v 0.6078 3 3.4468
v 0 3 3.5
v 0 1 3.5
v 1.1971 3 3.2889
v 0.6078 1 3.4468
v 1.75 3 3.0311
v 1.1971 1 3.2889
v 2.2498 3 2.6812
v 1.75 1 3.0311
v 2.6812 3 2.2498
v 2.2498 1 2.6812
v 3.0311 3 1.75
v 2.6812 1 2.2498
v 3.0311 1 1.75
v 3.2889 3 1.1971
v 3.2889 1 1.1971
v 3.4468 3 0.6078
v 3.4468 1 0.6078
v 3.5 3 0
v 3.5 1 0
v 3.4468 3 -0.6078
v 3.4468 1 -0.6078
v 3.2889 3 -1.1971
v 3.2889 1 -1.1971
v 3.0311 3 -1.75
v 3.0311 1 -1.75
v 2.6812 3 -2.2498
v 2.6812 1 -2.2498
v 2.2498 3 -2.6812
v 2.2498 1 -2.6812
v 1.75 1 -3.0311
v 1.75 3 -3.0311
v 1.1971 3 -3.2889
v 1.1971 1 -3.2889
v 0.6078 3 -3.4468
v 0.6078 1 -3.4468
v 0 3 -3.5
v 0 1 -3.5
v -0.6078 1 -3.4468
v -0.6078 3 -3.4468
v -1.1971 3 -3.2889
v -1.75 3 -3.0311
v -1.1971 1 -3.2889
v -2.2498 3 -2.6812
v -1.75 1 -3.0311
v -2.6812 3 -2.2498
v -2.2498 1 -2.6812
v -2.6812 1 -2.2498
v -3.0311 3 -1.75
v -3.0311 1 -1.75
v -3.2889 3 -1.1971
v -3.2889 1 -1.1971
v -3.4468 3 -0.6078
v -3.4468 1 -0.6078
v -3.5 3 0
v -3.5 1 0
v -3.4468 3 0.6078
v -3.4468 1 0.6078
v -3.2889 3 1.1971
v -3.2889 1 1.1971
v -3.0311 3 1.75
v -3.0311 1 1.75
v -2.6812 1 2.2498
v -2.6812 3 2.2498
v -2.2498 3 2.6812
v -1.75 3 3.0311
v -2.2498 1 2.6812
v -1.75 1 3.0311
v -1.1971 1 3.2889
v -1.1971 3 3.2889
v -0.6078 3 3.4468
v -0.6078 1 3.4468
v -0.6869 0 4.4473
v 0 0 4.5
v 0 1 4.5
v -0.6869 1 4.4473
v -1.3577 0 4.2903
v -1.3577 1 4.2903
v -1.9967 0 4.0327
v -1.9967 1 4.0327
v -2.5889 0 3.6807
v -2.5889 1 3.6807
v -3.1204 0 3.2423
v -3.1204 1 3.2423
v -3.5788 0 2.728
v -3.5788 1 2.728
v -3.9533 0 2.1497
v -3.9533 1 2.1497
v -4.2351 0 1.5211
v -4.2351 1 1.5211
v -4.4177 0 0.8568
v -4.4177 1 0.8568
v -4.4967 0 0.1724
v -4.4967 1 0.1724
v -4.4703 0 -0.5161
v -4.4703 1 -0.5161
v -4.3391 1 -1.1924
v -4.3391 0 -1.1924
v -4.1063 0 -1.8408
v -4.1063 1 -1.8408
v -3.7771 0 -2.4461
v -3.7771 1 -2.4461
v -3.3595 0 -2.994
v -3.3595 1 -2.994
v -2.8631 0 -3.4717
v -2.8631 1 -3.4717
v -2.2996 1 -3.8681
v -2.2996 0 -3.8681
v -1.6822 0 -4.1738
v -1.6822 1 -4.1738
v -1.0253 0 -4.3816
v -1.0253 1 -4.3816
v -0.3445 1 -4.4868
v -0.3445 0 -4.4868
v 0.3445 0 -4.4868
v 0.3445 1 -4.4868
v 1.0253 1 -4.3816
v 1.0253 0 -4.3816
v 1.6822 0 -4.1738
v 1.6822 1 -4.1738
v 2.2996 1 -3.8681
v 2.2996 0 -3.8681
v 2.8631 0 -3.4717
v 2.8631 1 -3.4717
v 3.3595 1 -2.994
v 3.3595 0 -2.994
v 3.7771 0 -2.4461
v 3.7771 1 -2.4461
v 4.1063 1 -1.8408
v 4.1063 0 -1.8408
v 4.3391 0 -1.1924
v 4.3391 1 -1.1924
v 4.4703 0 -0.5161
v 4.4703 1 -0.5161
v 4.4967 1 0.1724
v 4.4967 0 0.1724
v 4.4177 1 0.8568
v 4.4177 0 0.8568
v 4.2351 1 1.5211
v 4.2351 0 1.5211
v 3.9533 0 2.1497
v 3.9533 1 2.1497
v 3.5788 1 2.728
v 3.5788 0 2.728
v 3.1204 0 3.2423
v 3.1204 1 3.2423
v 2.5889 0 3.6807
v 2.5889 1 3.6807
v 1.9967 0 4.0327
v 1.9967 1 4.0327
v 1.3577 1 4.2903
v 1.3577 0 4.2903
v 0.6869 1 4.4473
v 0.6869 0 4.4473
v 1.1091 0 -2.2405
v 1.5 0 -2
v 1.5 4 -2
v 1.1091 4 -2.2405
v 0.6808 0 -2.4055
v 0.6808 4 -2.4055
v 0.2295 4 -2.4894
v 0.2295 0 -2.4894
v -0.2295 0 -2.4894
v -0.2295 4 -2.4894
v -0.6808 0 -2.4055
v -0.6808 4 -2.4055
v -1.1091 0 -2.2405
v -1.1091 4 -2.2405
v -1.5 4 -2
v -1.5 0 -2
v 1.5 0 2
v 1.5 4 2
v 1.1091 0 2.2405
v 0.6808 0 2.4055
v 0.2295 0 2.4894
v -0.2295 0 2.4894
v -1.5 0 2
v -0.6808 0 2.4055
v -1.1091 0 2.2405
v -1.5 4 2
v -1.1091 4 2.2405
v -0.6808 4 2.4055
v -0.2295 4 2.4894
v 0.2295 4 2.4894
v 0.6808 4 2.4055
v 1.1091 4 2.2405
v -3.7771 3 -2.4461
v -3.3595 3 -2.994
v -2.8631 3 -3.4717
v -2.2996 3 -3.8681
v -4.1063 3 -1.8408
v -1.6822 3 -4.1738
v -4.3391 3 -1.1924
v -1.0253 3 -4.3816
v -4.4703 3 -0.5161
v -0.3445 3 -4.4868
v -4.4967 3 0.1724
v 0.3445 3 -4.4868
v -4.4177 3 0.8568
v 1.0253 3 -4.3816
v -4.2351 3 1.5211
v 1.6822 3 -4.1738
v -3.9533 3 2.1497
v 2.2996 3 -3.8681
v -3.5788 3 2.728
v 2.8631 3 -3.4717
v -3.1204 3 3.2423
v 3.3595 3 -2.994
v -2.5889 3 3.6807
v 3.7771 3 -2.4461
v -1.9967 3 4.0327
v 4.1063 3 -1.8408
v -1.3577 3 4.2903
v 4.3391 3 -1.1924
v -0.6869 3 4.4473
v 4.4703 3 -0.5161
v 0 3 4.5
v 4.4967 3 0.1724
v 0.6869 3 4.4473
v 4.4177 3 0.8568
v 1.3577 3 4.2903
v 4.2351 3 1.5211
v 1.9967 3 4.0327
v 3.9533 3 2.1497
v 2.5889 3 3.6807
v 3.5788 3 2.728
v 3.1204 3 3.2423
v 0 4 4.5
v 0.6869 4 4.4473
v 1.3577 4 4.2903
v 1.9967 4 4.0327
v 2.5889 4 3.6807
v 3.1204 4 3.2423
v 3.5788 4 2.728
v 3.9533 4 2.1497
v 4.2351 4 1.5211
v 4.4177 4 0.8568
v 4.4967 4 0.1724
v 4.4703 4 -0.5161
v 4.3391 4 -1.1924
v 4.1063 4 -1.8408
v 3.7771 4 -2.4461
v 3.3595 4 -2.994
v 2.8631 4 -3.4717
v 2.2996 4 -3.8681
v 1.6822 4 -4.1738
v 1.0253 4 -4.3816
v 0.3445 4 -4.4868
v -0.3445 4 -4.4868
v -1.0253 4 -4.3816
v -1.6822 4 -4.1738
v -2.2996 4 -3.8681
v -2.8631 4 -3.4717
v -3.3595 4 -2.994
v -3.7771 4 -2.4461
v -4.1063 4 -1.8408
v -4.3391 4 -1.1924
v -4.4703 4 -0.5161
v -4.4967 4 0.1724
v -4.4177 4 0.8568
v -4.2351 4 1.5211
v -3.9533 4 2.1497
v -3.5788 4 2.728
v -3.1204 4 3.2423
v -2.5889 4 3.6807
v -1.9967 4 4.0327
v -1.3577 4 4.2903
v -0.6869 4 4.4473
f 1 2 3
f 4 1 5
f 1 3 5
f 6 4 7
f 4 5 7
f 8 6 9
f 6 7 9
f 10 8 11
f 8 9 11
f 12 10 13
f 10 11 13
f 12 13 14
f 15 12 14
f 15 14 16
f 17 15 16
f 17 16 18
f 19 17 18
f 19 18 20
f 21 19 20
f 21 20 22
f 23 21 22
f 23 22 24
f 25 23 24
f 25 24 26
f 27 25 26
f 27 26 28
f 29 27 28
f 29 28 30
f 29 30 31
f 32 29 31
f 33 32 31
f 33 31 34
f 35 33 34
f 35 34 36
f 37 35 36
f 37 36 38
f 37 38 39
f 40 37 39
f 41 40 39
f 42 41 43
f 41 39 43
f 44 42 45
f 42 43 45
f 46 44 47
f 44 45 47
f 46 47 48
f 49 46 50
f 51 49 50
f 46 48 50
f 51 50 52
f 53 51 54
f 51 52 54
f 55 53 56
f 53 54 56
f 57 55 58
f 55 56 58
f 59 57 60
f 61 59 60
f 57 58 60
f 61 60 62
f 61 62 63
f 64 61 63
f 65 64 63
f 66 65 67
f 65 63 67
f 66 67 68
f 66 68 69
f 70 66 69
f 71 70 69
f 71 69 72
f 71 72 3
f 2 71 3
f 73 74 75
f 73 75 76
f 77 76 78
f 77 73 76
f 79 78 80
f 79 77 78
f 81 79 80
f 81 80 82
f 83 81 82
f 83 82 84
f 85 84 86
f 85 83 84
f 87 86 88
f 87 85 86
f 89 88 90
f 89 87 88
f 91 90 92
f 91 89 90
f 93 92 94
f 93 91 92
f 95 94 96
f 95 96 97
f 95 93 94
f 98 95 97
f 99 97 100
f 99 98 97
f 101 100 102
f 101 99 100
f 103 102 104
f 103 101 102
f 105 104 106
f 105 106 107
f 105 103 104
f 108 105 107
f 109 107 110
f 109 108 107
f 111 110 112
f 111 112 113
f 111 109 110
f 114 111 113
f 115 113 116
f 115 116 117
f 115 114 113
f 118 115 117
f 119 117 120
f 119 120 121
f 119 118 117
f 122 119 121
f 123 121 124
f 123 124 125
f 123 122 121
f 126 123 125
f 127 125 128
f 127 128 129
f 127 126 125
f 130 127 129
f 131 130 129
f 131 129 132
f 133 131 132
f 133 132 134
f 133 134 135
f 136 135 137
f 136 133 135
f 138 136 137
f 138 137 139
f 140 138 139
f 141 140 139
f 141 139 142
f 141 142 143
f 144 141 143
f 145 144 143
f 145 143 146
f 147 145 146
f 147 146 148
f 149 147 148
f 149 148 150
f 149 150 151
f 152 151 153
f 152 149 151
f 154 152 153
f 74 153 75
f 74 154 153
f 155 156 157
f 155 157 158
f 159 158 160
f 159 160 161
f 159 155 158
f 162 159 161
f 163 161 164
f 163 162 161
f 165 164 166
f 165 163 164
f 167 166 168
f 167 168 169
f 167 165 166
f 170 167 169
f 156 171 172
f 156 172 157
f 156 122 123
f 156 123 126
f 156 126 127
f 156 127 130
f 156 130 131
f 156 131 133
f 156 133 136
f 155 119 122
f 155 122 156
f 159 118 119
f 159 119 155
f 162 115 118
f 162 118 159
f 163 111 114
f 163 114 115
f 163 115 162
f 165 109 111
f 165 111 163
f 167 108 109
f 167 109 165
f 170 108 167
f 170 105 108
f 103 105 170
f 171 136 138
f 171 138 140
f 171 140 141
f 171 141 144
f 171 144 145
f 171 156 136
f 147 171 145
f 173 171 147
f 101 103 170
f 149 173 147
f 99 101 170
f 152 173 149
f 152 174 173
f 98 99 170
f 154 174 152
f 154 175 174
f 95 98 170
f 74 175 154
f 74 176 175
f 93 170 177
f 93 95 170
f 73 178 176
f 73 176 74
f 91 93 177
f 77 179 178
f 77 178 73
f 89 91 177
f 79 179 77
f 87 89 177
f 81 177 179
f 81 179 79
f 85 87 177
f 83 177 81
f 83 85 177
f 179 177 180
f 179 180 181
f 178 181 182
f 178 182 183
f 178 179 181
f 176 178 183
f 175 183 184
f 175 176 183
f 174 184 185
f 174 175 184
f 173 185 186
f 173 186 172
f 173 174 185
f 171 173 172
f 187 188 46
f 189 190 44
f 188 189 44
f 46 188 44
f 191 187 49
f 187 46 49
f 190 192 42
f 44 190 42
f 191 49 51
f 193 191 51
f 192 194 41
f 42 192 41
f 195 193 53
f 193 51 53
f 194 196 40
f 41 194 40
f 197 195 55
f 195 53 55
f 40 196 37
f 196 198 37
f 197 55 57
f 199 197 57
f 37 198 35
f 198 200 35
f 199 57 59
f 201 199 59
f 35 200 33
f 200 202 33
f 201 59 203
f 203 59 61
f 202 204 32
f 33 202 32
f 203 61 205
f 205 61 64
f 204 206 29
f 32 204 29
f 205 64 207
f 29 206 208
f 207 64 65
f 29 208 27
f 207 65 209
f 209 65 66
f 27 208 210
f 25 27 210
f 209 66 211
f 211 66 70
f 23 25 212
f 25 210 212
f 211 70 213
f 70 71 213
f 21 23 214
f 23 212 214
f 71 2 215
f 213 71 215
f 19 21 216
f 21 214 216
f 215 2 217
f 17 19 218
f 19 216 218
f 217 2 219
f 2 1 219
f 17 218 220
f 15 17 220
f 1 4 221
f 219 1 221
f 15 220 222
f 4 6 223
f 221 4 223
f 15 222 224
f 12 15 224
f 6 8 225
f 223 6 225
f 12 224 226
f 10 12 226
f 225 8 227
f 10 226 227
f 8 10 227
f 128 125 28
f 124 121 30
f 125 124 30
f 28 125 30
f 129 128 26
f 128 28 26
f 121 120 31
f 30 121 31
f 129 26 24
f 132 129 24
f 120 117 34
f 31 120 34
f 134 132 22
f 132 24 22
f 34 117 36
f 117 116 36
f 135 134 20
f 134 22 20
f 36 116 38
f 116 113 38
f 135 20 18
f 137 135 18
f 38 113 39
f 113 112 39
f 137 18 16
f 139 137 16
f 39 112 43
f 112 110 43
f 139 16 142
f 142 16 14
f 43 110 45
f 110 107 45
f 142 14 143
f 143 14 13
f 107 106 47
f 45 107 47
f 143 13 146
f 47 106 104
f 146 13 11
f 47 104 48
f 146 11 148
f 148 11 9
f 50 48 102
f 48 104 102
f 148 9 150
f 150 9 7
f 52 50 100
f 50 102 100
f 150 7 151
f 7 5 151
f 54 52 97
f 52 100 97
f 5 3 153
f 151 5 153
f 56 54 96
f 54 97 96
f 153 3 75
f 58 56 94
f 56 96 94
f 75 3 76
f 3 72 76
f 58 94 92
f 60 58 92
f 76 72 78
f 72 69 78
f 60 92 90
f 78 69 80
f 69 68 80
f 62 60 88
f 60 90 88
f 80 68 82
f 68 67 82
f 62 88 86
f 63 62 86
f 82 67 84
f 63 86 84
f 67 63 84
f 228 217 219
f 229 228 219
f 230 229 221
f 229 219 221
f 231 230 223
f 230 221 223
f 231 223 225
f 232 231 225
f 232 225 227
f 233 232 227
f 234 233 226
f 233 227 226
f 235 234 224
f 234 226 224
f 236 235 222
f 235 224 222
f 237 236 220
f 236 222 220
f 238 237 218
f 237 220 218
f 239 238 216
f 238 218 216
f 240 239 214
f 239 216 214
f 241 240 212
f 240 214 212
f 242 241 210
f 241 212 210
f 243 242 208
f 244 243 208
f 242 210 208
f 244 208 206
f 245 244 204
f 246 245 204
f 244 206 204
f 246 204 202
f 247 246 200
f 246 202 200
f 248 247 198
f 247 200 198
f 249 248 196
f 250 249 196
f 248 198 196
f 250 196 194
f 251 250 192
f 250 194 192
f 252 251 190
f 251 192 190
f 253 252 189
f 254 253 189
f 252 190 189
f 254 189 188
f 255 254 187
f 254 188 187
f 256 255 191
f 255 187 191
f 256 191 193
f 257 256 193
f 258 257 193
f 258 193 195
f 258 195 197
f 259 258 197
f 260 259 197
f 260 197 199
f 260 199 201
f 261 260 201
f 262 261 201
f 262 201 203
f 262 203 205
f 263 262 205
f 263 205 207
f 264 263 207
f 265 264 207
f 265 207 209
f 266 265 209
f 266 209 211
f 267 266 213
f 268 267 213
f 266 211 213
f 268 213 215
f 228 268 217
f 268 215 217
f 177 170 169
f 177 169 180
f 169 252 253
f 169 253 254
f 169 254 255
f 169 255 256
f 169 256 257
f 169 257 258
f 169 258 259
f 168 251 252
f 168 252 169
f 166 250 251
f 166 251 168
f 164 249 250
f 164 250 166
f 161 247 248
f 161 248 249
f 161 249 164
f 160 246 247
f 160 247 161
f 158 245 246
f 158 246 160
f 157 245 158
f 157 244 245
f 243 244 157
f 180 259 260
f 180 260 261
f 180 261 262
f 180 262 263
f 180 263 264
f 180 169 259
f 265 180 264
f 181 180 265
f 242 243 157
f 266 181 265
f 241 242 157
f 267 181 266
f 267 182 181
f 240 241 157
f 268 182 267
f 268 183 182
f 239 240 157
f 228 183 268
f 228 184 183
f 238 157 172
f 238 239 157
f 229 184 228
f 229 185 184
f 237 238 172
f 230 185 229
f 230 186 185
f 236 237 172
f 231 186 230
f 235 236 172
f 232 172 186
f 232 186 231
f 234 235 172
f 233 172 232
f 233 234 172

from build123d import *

# Parameters (mm, degrees)
SKETCH1_R           = 3.5
BOSS_EXTRUDE1_DEPTH = 4
BOSS_EXTRUDE2_START = -1
SKETCH2_R           = 4.5
SKETCH2_R_2         = 3.5
BOSS_EXTRUDE2_DEPTH = 1
SKETCH3_R           = 4.5
SKETCH3_R_2         = 3.5
BOSS_EXTRUDE4_DEPTH = 1


with BuildPart() as part:
    # Sketch1 → Boss-Extrude1 (new body)
    with BuildSketch(Plane(origin=(0, 0, 0), x_dir=(1, 0, 0), z_dir=(0, 1, 0))):
        with Locations(Location((0, 0, 0), (0, 0, 270))):
            Circle(SKETCH1_R)
        with BuildLine():
            Line((-1.5, 2), (-1.5, -2))
            ThreePointArc((-1.5, -2), (0, -2.5), (1.5, -2))
            Line((1.5, -2), (1.5, 2))
            ThreePointArc((1.5, 2), (0, 2.5), (-1.5, 2))
        make_face(mode=Mode.SUBTRACT)
    extrude(amount=BOSS_EXTRUDE1_DEPTH)

    # Sketch2 → Boss-Extrude2 (add)
    with BuildSketch(Plane(origin=(0, 4, 0), x_dir=(1, 0, 0), z_dir=(0, 1, 0)).offset(BOSS_EXTRUDE2_START)):
        with Locations(Location((0, 0, 0), (0, 0, 270))):
            Circle(SKETCH2_R)
        with Locations(Location((0, 0, 0), (0, 0, 270))):
            Circle(SKETCH2_R_2, mode=Mode.SUBTRACT)
    extrude(amount=BOSS_EXTRUDE2_DEPTH)

    # Sketch3 → Boss-Extrude4 (add)
    with BuildSketch(Plane.XZ):
        with Locations(Location((0, 0, 0), (0, 0, 90))):
            Circle(SKETCH3_R)
        with Locations(Location((0, 0, 0), (0, 0, 270))):
            Circle(SKETCH3_R_2, mode=Mode.SUBTRACT)
    extrude(amount=-BOSS_EXTRUDE4_DEPTH)


solid = part.part
